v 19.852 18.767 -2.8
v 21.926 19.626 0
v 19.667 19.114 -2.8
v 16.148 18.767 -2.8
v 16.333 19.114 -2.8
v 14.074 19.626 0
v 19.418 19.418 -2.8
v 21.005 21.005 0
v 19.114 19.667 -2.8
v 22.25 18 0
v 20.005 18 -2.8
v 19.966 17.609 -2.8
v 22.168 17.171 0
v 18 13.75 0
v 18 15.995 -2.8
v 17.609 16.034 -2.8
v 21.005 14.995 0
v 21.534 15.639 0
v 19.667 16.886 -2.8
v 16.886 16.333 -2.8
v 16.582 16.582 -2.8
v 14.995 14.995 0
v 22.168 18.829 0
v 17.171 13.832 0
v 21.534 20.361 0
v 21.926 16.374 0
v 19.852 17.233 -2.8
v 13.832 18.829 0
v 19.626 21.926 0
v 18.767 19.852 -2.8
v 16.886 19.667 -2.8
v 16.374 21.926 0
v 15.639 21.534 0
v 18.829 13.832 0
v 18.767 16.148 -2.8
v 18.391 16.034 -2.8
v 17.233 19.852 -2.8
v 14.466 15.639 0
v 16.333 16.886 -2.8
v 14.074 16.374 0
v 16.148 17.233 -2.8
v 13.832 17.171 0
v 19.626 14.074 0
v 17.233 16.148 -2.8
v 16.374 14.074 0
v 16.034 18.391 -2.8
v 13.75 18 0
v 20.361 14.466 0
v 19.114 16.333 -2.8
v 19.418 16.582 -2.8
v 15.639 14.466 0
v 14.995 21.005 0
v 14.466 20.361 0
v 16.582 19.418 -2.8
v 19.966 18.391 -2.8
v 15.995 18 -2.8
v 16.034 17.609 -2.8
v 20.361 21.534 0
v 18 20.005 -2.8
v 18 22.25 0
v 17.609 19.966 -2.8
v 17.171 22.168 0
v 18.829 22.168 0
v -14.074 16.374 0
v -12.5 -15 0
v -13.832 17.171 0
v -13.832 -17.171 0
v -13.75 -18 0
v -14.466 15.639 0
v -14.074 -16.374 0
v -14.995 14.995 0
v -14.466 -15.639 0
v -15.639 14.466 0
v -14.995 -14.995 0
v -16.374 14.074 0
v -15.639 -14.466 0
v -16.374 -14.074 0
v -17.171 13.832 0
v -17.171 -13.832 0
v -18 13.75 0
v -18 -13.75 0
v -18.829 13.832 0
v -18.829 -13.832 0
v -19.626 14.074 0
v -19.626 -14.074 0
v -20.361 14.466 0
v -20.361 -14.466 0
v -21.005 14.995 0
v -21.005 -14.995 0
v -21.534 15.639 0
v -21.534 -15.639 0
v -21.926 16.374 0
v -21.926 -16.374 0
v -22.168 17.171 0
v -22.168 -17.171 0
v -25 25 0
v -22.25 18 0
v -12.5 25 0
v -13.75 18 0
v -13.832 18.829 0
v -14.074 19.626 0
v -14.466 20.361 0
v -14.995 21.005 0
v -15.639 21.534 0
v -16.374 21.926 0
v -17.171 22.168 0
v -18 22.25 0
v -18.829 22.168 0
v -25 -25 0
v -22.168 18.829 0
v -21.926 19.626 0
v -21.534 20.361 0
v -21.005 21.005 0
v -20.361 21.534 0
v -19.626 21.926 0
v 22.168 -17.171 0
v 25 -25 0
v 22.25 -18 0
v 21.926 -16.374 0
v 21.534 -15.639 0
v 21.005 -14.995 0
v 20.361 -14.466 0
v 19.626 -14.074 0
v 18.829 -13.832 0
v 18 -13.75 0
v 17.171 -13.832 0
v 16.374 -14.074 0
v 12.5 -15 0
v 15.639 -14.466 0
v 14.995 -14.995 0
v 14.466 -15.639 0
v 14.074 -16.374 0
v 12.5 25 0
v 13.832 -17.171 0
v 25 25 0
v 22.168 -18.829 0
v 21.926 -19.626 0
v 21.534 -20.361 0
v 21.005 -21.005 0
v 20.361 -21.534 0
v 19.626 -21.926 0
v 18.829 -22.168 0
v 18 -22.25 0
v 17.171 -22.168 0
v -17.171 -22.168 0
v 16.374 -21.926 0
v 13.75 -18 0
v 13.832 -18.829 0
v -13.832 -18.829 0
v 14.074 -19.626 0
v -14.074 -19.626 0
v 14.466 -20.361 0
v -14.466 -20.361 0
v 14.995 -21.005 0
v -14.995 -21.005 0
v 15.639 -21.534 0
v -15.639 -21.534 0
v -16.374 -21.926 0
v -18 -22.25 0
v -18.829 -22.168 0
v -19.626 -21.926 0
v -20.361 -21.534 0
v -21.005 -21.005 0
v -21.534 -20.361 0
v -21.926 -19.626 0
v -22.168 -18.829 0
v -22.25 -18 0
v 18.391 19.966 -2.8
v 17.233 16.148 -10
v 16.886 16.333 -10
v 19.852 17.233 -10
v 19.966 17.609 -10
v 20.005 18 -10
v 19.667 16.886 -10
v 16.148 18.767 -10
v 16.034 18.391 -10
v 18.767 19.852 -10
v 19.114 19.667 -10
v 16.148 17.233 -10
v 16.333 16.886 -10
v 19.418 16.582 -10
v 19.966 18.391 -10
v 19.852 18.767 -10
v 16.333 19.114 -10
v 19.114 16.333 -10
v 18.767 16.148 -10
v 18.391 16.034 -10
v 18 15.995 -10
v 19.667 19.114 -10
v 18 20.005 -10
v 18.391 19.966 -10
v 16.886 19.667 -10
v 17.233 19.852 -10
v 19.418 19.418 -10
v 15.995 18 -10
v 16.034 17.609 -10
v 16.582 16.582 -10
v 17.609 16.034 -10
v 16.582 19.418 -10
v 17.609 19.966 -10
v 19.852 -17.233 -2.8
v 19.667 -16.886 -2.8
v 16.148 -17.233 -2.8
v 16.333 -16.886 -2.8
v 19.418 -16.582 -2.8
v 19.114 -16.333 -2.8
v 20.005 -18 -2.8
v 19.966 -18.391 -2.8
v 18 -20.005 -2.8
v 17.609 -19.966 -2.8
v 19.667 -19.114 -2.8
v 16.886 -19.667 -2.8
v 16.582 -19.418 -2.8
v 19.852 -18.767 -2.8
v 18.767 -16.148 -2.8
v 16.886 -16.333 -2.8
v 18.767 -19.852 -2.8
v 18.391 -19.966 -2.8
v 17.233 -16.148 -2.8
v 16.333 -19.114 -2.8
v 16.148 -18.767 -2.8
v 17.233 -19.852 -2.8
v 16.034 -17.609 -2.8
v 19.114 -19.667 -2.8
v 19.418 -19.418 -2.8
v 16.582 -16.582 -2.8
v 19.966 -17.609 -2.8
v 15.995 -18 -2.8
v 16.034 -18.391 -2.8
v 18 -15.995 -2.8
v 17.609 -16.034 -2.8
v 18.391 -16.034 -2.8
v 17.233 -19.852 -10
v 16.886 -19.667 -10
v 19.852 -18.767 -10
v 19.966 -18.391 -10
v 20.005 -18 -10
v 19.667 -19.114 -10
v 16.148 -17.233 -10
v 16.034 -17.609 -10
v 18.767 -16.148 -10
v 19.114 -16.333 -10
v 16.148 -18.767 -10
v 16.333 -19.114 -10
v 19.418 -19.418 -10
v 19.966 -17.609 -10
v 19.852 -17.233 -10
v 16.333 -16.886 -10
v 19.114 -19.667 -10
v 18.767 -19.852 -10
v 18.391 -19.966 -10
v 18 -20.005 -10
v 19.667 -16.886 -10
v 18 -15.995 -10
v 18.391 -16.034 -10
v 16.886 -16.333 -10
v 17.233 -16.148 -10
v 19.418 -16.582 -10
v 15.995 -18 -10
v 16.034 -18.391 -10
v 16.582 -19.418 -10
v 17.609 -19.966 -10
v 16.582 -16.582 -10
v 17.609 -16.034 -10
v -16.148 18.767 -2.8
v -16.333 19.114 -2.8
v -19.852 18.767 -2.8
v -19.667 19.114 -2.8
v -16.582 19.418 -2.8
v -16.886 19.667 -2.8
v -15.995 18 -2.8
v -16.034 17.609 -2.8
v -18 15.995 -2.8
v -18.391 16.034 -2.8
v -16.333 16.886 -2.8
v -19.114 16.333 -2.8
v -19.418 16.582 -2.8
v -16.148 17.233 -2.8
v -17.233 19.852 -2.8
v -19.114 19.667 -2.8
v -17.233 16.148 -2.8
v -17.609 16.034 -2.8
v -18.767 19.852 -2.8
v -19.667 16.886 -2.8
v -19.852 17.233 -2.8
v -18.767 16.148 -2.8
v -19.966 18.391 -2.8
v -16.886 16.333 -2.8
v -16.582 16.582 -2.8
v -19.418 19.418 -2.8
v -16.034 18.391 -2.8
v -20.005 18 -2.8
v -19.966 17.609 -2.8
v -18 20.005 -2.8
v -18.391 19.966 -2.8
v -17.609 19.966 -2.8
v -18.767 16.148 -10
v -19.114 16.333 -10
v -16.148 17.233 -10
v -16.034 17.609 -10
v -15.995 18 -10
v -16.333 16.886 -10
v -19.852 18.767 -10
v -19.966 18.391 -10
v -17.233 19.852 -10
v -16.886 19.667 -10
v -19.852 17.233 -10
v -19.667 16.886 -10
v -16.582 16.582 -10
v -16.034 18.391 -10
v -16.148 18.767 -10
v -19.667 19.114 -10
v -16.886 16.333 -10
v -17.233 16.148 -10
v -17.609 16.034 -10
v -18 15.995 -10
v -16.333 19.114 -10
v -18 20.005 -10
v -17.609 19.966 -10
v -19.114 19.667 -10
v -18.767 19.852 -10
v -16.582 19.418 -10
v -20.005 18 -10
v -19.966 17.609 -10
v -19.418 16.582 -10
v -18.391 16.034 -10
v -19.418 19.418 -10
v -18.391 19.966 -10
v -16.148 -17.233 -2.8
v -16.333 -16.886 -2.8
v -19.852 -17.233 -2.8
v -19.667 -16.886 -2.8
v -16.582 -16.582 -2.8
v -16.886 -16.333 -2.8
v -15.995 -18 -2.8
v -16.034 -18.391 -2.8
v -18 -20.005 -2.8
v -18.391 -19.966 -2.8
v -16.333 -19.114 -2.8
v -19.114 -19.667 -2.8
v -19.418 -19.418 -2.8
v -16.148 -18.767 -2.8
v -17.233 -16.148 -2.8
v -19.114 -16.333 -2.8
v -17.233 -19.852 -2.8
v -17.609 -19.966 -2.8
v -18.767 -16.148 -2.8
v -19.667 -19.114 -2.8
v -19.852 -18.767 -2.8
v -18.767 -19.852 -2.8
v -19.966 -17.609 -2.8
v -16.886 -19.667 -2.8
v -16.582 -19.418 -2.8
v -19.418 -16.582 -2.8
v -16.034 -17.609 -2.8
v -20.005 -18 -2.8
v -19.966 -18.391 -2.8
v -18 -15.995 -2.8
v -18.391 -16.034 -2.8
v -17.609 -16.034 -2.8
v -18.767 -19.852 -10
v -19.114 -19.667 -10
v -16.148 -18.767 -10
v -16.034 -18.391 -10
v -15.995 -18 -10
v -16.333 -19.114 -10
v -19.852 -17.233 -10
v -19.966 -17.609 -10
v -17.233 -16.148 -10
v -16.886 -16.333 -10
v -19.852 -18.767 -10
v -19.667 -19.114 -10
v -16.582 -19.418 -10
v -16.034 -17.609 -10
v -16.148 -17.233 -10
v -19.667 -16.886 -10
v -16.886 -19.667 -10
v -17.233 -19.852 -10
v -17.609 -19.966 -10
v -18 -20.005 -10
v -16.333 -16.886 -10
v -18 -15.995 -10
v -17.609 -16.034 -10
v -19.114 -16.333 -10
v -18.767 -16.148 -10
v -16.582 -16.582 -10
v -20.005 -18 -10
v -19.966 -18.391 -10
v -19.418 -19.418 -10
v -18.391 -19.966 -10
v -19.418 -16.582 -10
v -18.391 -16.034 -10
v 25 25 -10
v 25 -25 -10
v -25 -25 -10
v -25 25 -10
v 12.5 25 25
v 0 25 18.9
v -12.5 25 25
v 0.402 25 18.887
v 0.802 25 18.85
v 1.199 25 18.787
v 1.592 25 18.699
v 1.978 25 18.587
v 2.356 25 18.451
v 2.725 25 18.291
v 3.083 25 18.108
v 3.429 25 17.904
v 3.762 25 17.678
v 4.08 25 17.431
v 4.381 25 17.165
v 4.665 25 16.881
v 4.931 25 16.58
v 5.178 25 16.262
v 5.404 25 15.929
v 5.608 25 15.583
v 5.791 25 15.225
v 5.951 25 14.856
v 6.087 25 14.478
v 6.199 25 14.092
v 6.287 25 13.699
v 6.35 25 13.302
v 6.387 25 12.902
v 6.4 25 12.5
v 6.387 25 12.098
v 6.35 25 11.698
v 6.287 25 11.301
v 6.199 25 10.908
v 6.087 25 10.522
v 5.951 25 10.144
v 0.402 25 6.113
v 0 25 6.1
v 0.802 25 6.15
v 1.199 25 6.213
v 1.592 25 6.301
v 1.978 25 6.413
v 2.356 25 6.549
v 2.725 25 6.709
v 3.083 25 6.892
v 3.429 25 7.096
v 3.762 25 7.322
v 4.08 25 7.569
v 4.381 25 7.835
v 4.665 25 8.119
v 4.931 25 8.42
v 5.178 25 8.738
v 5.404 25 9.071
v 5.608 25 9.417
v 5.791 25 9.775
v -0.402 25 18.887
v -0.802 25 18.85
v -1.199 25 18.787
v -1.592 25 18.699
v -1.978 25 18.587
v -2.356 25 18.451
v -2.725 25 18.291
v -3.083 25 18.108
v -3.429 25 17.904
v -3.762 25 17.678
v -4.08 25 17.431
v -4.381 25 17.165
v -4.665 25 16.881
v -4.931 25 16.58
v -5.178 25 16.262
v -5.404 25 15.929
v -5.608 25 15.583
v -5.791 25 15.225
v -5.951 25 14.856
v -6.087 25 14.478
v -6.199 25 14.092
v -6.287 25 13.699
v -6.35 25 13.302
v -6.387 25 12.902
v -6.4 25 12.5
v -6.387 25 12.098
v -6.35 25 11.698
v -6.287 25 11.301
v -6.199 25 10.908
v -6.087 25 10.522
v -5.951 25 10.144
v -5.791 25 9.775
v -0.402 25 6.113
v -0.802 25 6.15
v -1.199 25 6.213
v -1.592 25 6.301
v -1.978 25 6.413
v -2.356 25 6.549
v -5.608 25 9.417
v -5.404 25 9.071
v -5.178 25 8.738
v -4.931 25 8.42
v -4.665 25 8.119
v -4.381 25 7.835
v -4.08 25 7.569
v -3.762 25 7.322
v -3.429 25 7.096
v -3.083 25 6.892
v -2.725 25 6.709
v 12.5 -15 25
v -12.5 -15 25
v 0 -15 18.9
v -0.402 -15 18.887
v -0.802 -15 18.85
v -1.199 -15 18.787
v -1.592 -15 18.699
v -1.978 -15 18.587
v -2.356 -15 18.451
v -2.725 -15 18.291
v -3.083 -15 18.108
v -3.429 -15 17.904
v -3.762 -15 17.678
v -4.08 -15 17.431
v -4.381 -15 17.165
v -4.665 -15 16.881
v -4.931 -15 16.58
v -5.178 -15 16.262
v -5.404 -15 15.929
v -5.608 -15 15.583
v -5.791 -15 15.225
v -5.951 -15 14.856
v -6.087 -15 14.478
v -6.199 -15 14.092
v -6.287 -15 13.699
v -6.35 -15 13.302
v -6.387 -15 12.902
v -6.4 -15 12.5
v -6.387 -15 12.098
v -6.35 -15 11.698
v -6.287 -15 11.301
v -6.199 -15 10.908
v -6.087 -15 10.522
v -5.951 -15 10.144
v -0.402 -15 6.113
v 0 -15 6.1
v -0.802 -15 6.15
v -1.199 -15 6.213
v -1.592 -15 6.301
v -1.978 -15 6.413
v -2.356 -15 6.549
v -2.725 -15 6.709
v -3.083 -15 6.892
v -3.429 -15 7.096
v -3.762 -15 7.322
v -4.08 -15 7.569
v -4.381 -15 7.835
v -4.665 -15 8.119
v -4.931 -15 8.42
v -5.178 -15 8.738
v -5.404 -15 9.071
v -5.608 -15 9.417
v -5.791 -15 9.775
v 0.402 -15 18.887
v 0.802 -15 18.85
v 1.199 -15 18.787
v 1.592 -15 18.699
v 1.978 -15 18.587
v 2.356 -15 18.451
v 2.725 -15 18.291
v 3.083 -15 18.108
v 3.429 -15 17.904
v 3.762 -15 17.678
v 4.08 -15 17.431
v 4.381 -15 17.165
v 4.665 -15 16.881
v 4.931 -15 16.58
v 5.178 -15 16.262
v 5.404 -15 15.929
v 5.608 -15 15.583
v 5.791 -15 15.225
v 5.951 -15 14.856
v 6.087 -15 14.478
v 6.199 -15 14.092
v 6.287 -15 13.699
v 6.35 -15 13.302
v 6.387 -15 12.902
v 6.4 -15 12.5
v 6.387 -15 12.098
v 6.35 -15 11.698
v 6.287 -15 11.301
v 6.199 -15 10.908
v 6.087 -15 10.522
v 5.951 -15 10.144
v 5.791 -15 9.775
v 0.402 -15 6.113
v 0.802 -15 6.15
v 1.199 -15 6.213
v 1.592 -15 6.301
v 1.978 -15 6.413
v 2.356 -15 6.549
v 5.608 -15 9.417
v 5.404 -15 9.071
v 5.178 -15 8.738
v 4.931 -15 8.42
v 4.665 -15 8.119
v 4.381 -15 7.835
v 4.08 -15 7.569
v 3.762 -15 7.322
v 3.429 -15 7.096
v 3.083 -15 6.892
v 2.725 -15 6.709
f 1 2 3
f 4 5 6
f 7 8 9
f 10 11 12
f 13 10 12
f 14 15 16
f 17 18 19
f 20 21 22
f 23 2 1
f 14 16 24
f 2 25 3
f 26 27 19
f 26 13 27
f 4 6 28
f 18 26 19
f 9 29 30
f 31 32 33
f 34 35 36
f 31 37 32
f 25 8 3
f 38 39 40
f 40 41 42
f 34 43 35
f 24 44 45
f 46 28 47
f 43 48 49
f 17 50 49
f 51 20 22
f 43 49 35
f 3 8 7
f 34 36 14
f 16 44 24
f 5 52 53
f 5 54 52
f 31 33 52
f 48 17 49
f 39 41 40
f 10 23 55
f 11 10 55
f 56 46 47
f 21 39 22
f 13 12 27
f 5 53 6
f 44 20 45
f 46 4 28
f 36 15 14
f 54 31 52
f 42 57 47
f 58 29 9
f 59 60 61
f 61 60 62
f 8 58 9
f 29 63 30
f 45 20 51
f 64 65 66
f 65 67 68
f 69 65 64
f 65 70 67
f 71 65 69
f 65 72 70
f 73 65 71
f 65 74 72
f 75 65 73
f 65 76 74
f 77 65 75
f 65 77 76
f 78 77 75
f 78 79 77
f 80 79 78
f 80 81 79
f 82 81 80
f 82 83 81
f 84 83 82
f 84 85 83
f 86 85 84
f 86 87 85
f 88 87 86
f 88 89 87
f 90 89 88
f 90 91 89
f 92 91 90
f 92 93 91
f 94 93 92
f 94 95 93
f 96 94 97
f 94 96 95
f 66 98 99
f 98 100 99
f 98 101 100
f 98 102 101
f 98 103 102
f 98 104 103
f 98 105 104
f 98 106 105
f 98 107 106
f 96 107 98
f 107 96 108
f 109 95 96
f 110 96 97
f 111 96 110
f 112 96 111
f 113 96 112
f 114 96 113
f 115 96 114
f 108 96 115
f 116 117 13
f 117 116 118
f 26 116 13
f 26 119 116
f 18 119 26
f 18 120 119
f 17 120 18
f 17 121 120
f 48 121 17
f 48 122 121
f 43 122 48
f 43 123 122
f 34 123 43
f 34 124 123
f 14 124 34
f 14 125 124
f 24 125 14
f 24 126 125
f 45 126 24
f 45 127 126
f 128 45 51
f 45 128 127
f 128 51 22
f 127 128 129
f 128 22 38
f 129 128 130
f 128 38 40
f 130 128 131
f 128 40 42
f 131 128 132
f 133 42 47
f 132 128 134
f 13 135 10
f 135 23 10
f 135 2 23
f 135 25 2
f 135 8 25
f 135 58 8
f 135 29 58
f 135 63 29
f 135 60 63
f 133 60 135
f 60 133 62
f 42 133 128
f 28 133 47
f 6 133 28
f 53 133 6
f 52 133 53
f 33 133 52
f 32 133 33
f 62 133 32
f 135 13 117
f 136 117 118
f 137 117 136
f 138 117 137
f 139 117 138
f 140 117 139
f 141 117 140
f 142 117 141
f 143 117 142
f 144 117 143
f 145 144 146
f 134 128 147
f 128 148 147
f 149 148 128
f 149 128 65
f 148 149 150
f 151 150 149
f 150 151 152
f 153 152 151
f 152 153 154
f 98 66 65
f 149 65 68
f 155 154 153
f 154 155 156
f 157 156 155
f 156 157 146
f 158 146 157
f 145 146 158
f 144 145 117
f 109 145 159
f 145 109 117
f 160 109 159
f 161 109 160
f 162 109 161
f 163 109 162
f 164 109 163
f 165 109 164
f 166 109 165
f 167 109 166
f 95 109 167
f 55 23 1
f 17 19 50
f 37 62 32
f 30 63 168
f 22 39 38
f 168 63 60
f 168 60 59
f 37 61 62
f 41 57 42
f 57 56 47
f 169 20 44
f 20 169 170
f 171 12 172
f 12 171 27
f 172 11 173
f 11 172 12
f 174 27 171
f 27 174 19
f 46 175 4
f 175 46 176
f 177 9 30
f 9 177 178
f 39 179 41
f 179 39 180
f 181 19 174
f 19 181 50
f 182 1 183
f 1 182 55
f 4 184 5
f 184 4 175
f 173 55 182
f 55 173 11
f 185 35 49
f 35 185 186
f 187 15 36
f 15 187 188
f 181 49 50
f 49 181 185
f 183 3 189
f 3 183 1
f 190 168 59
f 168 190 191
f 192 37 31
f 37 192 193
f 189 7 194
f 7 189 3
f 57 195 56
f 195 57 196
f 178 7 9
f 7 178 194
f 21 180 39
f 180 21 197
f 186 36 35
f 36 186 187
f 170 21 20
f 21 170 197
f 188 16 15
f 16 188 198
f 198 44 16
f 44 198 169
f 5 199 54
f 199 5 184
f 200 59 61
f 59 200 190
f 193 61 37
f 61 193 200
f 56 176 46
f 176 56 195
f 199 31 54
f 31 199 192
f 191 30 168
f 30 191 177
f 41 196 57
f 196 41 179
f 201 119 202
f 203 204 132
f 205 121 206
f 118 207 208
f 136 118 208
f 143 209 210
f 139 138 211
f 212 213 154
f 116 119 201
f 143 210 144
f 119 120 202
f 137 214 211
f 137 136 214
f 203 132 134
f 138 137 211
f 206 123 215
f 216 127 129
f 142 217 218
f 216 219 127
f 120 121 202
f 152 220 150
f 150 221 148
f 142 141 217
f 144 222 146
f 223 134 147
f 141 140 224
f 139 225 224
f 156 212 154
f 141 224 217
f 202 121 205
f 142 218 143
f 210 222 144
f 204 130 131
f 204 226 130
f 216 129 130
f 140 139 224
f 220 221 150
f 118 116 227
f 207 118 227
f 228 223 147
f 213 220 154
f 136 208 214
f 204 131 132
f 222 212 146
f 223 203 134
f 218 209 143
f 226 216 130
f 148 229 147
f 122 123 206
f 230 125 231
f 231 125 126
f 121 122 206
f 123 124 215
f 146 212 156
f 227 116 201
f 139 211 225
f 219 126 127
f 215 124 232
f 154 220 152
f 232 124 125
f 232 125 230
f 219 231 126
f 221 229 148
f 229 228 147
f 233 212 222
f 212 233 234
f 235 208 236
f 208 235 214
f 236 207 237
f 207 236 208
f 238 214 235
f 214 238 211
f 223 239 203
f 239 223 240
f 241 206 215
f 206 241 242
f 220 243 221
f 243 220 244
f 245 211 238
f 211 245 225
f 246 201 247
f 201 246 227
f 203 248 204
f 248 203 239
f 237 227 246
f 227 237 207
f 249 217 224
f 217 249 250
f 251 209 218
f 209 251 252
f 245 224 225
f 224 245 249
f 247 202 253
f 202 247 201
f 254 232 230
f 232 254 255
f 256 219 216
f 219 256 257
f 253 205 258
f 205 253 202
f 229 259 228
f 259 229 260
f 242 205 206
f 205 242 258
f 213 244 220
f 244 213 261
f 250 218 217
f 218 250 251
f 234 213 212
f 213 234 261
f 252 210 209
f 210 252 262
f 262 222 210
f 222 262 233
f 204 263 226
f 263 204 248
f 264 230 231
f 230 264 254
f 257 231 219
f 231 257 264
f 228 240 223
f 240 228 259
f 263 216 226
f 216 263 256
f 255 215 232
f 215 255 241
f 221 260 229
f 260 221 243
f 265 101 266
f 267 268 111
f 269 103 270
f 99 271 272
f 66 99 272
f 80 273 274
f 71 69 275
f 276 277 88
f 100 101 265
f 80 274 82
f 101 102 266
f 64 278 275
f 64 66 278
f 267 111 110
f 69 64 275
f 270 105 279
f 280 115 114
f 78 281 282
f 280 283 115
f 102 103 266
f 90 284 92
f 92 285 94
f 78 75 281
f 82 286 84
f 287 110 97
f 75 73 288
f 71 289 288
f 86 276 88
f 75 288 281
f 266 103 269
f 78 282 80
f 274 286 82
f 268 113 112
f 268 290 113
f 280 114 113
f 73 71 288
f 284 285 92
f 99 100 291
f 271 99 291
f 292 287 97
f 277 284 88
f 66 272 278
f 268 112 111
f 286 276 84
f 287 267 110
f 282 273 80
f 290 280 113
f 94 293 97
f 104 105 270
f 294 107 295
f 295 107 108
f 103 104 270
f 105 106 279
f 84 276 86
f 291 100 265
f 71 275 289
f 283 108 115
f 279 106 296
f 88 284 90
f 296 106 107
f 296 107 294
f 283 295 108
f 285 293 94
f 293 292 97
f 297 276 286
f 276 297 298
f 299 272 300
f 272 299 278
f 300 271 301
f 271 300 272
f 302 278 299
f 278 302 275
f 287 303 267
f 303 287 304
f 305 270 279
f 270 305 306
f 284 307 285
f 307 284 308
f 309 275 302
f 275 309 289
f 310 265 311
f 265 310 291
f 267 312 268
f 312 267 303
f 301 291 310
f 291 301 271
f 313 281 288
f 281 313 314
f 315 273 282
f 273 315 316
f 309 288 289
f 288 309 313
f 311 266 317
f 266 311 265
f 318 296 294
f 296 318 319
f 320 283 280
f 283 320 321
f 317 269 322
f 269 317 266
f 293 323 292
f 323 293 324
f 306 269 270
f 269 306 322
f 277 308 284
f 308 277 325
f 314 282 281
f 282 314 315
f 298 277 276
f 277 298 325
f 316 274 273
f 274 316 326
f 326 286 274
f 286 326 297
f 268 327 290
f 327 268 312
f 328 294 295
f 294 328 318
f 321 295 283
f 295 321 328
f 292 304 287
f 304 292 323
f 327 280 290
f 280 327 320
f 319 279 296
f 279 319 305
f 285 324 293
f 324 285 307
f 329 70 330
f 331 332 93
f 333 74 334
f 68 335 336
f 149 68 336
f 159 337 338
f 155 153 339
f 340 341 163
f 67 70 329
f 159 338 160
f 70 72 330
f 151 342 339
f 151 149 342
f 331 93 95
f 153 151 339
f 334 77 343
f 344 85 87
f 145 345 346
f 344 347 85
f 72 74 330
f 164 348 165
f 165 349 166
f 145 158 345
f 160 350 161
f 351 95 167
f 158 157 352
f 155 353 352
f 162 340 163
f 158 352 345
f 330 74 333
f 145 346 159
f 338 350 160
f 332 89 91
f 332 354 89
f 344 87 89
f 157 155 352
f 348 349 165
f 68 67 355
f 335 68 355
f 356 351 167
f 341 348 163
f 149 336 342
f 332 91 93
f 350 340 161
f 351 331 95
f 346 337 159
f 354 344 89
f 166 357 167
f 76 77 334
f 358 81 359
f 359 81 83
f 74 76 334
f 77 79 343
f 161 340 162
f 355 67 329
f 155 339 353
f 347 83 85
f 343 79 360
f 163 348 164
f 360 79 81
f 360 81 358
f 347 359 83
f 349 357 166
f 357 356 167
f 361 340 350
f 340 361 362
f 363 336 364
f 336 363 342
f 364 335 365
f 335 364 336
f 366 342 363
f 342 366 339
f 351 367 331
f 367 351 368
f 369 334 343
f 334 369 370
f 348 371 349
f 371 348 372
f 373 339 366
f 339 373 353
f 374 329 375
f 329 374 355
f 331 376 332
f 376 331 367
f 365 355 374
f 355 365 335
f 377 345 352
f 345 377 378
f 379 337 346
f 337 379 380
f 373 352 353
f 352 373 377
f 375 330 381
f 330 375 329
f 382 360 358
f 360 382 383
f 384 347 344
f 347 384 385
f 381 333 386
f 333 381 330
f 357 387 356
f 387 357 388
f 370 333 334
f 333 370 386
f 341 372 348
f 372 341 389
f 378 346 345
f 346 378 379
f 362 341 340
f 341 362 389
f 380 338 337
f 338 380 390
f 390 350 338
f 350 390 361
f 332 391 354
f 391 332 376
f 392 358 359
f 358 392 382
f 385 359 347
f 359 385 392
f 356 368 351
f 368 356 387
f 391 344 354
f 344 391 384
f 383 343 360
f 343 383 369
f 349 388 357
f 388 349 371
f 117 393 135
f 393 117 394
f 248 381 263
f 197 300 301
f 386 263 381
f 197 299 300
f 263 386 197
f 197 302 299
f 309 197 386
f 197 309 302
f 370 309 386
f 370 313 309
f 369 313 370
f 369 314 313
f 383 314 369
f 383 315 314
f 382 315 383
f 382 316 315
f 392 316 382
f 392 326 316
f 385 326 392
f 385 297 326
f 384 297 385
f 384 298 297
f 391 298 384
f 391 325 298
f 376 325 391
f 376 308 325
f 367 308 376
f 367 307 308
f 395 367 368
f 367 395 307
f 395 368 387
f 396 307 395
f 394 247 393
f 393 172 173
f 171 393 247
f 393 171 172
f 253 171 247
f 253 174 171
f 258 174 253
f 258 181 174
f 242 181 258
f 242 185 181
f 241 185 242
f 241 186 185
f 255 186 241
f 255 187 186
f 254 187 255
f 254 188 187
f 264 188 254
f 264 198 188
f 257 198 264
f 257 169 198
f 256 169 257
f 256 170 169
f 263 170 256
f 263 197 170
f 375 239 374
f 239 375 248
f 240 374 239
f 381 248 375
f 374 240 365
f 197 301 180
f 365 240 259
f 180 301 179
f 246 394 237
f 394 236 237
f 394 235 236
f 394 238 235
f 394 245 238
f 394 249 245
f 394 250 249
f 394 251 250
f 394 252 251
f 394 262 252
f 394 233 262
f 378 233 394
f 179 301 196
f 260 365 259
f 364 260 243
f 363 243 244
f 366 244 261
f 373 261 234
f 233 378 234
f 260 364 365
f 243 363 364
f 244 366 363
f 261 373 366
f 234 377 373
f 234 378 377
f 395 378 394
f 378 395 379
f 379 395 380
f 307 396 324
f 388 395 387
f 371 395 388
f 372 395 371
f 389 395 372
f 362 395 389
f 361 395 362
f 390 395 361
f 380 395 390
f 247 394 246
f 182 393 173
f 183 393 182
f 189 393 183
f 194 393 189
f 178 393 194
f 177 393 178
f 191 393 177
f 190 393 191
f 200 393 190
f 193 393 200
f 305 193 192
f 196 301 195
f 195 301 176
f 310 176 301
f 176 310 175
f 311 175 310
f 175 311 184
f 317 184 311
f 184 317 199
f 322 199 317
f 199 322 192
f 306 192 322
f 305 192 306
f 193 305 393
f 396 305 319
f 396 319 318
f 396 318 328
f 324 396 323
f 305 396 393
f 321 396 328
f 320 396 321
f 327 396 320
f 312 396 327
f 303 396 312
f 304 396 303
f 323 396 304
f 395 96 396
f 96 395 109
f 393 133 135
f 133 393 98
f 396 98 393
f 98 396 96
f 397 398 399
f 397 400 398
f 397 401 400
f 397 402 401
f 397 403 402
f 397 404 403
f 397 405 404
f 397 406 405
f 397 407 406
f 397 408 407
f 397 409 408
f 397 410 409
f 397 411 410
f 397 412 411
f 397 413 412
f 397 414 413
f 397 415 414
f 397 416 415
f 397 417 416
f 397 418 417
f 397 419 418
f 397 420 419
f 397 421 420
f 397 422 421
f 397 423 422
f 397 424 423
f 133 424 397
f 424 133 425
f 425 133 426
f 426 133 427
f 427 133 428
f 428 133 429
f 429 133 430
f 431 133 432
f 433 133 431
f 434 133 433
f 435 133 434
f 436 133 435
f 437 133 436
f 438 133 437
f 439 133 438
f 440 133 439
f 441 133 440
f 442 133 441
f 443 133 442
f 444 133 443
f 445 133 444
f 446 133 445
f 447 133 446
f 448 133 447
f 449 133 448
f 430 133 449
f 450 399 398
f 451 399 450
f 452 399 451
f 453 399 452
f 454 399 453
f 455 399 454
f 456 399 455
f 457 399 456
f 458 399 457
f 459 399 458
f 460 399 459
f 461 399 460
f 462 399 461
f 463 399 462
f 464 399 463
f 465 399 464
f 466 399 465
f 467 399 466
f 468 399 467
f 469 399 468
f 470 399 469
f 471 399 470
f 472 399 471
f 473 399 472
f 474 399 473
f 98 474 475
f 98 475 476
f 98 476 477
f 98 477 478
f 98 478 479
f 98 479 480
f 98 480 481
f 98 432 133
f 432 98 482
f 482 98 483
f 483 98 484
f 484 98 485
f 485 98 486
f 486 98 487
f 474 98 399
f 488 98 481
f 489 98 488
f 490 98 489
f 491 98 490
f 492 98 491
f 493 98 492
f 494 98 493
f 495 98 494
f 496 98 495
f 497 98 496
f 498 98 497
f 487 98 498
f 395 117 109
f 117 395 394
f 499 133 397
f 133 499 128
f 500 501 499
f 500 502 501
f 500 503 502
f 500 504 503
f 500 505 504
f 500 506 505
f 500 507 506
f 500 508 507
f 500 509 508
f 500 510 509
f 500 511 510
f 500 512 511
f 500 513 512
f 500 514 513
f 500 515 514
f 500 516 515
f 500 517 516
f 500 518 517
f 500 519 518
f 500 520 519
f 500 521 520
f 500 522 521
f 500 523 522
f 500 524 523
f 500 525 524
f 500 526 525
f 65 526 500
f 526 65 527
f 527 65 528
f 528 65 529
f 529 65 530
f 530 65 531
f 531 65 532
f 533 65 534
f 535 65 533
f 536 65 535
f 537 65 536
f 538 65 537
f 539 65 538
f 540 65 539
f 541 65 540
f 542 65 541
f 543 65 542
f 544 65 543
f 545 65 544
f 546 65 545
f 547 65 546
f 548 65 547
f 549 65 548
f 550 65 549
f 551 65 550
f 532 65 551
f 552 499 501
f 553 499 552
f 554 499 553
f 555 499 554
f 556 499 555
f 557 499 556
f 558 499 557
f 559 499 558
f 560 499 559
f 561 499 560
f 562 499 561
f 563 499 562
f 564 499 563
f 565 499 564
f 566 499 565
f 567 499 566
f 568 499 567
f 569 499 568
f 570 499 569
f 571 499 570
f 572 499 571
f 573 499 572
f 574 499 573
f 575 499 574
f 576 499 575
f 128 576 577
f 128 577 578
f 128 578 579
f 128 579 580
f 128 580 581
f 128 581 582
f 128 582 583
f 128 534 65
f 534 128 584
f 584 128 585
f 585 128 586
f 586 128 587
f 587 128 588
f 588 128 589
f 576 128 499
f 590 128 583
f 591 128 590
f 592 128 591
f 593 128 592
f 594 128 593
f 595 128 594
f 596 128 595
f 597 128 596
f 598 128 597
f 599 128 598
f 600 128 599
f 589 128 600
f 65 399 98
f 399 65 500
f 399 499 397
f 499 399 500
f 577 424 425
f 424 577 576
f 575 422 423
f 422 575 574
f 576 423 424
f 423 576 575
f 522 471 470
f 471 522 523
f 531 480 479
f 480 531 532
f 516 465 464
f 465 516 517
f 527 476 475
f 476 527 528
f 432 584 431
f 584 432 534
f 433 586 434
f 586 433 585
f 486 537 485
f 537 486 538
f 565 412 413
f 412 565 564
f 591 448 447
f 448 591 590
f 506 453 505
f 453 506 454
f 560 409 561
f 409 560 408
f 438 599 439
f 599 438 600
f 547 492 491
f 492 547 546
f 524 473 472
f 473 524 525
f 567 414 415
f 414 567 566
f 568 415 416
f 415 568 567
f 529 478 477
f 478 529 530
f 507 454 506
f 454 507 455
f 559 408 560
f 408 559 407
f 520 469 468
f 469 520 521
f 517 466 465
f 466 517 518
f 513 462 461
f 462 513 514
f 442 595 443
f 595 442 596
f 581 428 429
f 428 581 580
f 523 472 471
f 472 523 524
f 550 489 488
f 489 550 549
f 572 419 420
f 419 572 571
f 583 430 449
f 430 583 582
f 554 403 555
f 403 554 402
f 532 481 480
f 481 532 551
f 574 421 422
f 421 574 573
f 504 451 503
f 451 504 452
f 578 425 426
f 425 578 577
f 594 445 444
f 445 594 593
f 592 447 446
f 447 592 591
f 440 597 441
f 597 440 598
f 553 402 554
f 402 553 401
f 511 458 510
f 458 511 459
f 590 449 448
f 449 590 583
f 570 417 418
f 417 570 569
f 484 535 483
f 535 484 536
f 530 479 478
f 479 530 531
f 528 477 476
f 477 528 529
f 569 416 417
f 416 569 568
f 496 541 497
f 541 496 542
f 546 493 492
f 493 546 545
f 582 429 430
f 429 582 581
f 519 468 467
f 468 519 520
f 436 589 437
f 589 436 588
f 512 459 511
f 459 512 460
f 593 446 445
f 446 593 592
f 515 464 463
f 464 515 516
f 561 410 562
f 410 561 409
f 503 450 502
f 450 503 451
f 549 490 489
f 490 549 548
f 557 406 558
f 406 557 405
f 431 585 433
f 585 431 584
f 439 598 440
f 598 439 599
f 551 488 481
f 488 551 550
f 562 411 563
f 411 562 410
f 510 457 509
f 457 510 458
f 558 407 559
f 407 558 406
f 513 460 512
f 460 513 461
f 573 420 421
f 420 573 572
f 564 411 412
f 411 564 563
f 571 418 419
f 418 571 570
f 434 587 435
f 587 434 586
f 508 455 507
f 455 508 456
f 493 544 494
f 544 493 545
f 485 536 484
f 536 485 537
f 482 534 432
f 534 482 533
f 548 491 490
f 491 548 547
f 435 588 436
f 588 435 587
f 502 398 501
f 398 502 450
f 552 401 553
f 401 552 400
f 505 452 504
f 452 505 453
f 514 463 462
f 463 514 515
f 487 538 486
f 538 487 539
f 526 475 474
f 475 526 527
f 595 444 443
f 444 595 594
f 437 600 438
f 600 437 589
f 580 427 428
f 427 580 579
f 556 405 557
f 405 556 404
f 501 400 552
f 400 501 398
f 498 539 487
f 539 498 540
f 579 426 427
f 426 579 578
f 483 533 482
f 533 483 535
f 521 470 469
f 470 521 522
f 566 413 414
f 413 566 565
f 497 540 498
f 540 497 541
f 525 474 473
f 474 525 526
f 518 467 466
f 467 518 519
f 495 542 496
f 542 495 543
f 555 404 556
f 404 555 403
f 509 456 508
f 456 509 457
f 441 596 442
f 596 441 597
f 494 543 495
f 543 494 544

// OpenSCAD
// file: ScrewLibrary.scad
// Screw hole library

// Declare the supported screws here

// To add new screws, define the 5 values below, and add
// code to the IsScrewSupported() and ScrewHeadHeight() function
    
// spec is based on "traditional" wood screws
US5FlatStr = "US#5 Flat";
US5FlatHeadHeight = 2.8;    // caliper
US5FlatHeadDiameter = 6.35; // head bore 1/4
US5FlatHeadStraight = false;
US5FlatHeadHex = false;
US5FlatDiameter = 3.18;    // major diameter 1/8
US5FlatClearance = 0.5;

/* ad hoc measured by caliper
US5FlatHeadHeight = 2.8;
US5FlatHeadDiameter = 5.8;
US5FlatDiameter = 3.2;
US5FlatClearance = 0.5;
*/

US6FlatStr = "US#6 Flat";
US6FlatHeadHeight = 2.8; // A caliper
US6FlatHeadDiameter = 8.0; // head bore 9/32
US6FlatHeadStraight = false;
US6FlatHeadHex = false;
US6FlatDiameter = 3.51;     // major dia. 0.138"
US6FlatClearance = 0.5;

US8FlatStr = "US#8 Flat"; 
US8FlatHeadHeight = 3.6;
US8FlatHeadDiameter = 8.73; // head bore 11/32
US8FlatHeadStraight = false;
US8FlatHeadHex = false;
US8FlatDiameter = 4.17;     // major dia. 0.164"
US8FlatClearance = 0.5;

US8RoundStr = "US#8 Round"; 
US8RoundHeadHeight = 0.5; // keep a slight recess marking 
US8RoundHeadDiameter = 8.73; // head bore 11/32
US8RoundHeadStraight = false;
US8RoundHeadHex = false;
US8RoundDiameter = 4.17;     // major dia. 0.164"
US8RoundClearance = 0.5;

M3NutStr = "M3 Nut"; 
M3NutHeadHeight = 5; // double the m3 spec for more room 
M3NutHeadDiameter = 6.01; 
M3NutHeadStraight = true;
M3NutHeadHex = true;
M3NutDiameter = 3;   
M3NutClearance = 0.6;

PencilMarkerStr = "Pencil Marker";
PencilMarkerHeadHeight = 3;
PencilMarkerHeadDiameter = 4;
PencilMarkerHeadStraight = false;
PencilMarkerHeadHex = false;
PencilMarkerDiameter = 10;
PencilMarkerClearance = 0;

CustomScrewStr = "custom";

// Utilities
module CreateScrewHole(height=15,diameter=3.3) {
    // height is the hypothetical screw height. It
    // can be anything as long as it penetrates the
    // object we are modelling. So 15mm is plenty
    $fn=32;
    translate([0, 0, height / 2])
        cylinder(height, diameter / 2, diameter / 2, center = true);
}

module CreateScrewHead(headsize = 5.9, bodysize = 3.3, height = 2.8,is_hex = false) {
    $fn=is_hex? 6 : 32;
    translate([0, 0, height / 2])
        cylinder(height, headsize / 2, bodysize / 2, center = true);
}

module CreateHeadHole(headsize = 5.9, head_hole_length = 0, is_hex = false) {
    $fn=is_hex? 6 :32;
    r = headsize / 2;
    translate([0, 0, - head_hole_length / 2])
        cylinder(head_hole_length, r, r, true);
}

module CreateScrewRAW(
    head_diameter = 0,
    head_hole_length = 0,
    head_height = 0,
    head_straight = 0,
    head_hex = false,
    body_diameter = 0,
    body_length = 0)
{
    // the parameters should be already adjusted by clearance    
    union(){        
        CreateHeadHole(head_diameter, head_hole_length, head_hex);
  
        if (head_straight)
        {
            // no slope from head to screw hole
            CreateScrewHead(head_diameter, 
                head_diameter, head_height, head_hex);
        }
        else
        {
            // slope from head to screw hole
            CreateScrewHead(head_diameter, 
                body_diameter, head_height, head_hex);
        }
        
        translate([0,0,head_height])
        CreateScrewHole(body_length, body_diameter);
    }
}        

// Public interface
function IsScrewSupported(style) =
    style == US5FlatStr ||
    style == US6FlatStr ||
    style == US8FlatStr ||
    style == US8RoundStr ||
    style == M3NutStr ||
    style == PencilMarkerStr ||
    style == CustomScrewStr;
    
function ScrewHeadHeight(style) =
    style == US5FlatStr ? US5FlatHeadHeight :
      style == US6FlatStr ? US6FlatHeadHeight :
      style == US8FlatStr ? US8FlatHeadHeight : 
      style == US8RoundStr ? US8RoundHeadHeight :
      style == M3NutStr ? M3NutHeadHeight :
      style == PencilMarkerStr ? PencilMarkerHeadHeight : 0;

// Create screw using customized parameter specified by caller
module CreateCustomScrew(
    head_diameter = 0,
    head_hole_length = 0,
    head_height = 0,
    head_straight = true,
    head_hex = false,
    body_diameter = 0,
    body_length = 0,
    screw_clearance = 0)
{
    CreateScrewRAW(
        head_diameter + screw_clearance,
        head_hole_length,
        head_height,
        head_straight,
        head_hex,
        body_diameter + screw_clearance,
        body_length);
}

// Create screw using built-in parameter
module CreateScrew(
    style="",
    head_hole_length=0,
    body_length=15,
    // Below are required for custom screws only
    head_diameter=0,
    head_height=0,
    head_straight=true,
    head_hex = false,
    body_diameter=0,
    screw_clearance=0)
{        
    assert(IsScrewSupported(style));
    
    if (style==US5FlatStr) {
        CreateCustomScrew(
            US5FlatHeadDiameter,
            head_hole_length,
            US5FlatHeadHeight,
            US5FlatHeadStraight,
            US5FlatHeadHex,
            US5FlatDiameter,
            body_length,
            US5FlatClearance
        );
    }
    else if (style==US6FlatStr) {
        CreateCustomScrew(
            US6FlatHeadDiameter,
            head_hole_length,
            US6FlatHeadHeight,
            US6FlatHeadStraight,
            US6FlatHeadHex,
            US6FlatDiameter,
            body_length,
            US6FlatClearance
        );
    } else if (style == US8FlatStr) {
        CreateCustomScrew(
            US8FlatHeadDiameter,
            head_hole_length,
            US8FlatHeadHeight,
            US8FlatHeadStraight,
            US8FlatHeadHex,
            US8FlatDiameter,
            body_length,
            US8FlatClearance
        );
    } else if (style == US8RoundStr) {
        CreateCustomScrew(
            US8RoundHeadDiameter,
            head_hole_length,
            US8RoundHeadHeight,
            US8RoundHeadStraight,
            US8RoundHeadHex,
            US8RoundDiameter,
            body_length,
            US8RoundClearance
        );
    } else if (style == M3NutStr) {
        CreateCustomScrew(
            M3NutHeadDiameter,
            head_hole_length,
            M3NutHeadHeight,
            M3NutHeadStraight,
            M3NutHeadHex,
            M3NutDiameter,
            body_length,
            M3NutClearance
        );
    } else if (style == PencilMarkerStr) {
        CreateCustomScrew(
            PencilMarkerHeadDiameter,
            head_hole_length,
            PencilMarkerHeadHeight,
            PencilMarkerHeadStraight,
            PencilMarkerHeadHex,
            PencilMarkerDiameter,
            body_length,
            PencilMarkerClearance
        );
    } else if (style == CustomScrewStr) {
        CreateCustomScrew(
            head_diameter,
            head_hole_length,
            head_height,
            head_straight,
            head_hex,
            body_diameter,
            body_length,
            screw_clearance);
    }
    else assert(false);
} // end CreateScrew    



         
       
// main file
include <ScrewLibrary.scad>

$fn=100;


difference(){
    // plate
    translate([0,0,-5])
    cube([50,50,10], center=true);
    
    // screws
    translate([18,18,0])
    rotate([180,0,0])
    CreateScrew(US6FlatStr,0,20);
    
    translate([18,-18,0])
    rotate([180,0,0])
    CreateScrew(US6FlatStr,0,20);
    
    translate([-18,18,0])
    rotate([180,0,0])
    CreateScrew(US6FlatStr,0,20);
    
    translate([-18,-18,0])
    rotate([180,0,0])
    CreateScrew(US6FlatStr,0,20);
}
// mount
translate([0,5,12.5])
rotate([90,0,0])
color("pink")
difference(){
cube([25,25,40], center=true);
cylinder(40,r=6.4,center=true);
}
